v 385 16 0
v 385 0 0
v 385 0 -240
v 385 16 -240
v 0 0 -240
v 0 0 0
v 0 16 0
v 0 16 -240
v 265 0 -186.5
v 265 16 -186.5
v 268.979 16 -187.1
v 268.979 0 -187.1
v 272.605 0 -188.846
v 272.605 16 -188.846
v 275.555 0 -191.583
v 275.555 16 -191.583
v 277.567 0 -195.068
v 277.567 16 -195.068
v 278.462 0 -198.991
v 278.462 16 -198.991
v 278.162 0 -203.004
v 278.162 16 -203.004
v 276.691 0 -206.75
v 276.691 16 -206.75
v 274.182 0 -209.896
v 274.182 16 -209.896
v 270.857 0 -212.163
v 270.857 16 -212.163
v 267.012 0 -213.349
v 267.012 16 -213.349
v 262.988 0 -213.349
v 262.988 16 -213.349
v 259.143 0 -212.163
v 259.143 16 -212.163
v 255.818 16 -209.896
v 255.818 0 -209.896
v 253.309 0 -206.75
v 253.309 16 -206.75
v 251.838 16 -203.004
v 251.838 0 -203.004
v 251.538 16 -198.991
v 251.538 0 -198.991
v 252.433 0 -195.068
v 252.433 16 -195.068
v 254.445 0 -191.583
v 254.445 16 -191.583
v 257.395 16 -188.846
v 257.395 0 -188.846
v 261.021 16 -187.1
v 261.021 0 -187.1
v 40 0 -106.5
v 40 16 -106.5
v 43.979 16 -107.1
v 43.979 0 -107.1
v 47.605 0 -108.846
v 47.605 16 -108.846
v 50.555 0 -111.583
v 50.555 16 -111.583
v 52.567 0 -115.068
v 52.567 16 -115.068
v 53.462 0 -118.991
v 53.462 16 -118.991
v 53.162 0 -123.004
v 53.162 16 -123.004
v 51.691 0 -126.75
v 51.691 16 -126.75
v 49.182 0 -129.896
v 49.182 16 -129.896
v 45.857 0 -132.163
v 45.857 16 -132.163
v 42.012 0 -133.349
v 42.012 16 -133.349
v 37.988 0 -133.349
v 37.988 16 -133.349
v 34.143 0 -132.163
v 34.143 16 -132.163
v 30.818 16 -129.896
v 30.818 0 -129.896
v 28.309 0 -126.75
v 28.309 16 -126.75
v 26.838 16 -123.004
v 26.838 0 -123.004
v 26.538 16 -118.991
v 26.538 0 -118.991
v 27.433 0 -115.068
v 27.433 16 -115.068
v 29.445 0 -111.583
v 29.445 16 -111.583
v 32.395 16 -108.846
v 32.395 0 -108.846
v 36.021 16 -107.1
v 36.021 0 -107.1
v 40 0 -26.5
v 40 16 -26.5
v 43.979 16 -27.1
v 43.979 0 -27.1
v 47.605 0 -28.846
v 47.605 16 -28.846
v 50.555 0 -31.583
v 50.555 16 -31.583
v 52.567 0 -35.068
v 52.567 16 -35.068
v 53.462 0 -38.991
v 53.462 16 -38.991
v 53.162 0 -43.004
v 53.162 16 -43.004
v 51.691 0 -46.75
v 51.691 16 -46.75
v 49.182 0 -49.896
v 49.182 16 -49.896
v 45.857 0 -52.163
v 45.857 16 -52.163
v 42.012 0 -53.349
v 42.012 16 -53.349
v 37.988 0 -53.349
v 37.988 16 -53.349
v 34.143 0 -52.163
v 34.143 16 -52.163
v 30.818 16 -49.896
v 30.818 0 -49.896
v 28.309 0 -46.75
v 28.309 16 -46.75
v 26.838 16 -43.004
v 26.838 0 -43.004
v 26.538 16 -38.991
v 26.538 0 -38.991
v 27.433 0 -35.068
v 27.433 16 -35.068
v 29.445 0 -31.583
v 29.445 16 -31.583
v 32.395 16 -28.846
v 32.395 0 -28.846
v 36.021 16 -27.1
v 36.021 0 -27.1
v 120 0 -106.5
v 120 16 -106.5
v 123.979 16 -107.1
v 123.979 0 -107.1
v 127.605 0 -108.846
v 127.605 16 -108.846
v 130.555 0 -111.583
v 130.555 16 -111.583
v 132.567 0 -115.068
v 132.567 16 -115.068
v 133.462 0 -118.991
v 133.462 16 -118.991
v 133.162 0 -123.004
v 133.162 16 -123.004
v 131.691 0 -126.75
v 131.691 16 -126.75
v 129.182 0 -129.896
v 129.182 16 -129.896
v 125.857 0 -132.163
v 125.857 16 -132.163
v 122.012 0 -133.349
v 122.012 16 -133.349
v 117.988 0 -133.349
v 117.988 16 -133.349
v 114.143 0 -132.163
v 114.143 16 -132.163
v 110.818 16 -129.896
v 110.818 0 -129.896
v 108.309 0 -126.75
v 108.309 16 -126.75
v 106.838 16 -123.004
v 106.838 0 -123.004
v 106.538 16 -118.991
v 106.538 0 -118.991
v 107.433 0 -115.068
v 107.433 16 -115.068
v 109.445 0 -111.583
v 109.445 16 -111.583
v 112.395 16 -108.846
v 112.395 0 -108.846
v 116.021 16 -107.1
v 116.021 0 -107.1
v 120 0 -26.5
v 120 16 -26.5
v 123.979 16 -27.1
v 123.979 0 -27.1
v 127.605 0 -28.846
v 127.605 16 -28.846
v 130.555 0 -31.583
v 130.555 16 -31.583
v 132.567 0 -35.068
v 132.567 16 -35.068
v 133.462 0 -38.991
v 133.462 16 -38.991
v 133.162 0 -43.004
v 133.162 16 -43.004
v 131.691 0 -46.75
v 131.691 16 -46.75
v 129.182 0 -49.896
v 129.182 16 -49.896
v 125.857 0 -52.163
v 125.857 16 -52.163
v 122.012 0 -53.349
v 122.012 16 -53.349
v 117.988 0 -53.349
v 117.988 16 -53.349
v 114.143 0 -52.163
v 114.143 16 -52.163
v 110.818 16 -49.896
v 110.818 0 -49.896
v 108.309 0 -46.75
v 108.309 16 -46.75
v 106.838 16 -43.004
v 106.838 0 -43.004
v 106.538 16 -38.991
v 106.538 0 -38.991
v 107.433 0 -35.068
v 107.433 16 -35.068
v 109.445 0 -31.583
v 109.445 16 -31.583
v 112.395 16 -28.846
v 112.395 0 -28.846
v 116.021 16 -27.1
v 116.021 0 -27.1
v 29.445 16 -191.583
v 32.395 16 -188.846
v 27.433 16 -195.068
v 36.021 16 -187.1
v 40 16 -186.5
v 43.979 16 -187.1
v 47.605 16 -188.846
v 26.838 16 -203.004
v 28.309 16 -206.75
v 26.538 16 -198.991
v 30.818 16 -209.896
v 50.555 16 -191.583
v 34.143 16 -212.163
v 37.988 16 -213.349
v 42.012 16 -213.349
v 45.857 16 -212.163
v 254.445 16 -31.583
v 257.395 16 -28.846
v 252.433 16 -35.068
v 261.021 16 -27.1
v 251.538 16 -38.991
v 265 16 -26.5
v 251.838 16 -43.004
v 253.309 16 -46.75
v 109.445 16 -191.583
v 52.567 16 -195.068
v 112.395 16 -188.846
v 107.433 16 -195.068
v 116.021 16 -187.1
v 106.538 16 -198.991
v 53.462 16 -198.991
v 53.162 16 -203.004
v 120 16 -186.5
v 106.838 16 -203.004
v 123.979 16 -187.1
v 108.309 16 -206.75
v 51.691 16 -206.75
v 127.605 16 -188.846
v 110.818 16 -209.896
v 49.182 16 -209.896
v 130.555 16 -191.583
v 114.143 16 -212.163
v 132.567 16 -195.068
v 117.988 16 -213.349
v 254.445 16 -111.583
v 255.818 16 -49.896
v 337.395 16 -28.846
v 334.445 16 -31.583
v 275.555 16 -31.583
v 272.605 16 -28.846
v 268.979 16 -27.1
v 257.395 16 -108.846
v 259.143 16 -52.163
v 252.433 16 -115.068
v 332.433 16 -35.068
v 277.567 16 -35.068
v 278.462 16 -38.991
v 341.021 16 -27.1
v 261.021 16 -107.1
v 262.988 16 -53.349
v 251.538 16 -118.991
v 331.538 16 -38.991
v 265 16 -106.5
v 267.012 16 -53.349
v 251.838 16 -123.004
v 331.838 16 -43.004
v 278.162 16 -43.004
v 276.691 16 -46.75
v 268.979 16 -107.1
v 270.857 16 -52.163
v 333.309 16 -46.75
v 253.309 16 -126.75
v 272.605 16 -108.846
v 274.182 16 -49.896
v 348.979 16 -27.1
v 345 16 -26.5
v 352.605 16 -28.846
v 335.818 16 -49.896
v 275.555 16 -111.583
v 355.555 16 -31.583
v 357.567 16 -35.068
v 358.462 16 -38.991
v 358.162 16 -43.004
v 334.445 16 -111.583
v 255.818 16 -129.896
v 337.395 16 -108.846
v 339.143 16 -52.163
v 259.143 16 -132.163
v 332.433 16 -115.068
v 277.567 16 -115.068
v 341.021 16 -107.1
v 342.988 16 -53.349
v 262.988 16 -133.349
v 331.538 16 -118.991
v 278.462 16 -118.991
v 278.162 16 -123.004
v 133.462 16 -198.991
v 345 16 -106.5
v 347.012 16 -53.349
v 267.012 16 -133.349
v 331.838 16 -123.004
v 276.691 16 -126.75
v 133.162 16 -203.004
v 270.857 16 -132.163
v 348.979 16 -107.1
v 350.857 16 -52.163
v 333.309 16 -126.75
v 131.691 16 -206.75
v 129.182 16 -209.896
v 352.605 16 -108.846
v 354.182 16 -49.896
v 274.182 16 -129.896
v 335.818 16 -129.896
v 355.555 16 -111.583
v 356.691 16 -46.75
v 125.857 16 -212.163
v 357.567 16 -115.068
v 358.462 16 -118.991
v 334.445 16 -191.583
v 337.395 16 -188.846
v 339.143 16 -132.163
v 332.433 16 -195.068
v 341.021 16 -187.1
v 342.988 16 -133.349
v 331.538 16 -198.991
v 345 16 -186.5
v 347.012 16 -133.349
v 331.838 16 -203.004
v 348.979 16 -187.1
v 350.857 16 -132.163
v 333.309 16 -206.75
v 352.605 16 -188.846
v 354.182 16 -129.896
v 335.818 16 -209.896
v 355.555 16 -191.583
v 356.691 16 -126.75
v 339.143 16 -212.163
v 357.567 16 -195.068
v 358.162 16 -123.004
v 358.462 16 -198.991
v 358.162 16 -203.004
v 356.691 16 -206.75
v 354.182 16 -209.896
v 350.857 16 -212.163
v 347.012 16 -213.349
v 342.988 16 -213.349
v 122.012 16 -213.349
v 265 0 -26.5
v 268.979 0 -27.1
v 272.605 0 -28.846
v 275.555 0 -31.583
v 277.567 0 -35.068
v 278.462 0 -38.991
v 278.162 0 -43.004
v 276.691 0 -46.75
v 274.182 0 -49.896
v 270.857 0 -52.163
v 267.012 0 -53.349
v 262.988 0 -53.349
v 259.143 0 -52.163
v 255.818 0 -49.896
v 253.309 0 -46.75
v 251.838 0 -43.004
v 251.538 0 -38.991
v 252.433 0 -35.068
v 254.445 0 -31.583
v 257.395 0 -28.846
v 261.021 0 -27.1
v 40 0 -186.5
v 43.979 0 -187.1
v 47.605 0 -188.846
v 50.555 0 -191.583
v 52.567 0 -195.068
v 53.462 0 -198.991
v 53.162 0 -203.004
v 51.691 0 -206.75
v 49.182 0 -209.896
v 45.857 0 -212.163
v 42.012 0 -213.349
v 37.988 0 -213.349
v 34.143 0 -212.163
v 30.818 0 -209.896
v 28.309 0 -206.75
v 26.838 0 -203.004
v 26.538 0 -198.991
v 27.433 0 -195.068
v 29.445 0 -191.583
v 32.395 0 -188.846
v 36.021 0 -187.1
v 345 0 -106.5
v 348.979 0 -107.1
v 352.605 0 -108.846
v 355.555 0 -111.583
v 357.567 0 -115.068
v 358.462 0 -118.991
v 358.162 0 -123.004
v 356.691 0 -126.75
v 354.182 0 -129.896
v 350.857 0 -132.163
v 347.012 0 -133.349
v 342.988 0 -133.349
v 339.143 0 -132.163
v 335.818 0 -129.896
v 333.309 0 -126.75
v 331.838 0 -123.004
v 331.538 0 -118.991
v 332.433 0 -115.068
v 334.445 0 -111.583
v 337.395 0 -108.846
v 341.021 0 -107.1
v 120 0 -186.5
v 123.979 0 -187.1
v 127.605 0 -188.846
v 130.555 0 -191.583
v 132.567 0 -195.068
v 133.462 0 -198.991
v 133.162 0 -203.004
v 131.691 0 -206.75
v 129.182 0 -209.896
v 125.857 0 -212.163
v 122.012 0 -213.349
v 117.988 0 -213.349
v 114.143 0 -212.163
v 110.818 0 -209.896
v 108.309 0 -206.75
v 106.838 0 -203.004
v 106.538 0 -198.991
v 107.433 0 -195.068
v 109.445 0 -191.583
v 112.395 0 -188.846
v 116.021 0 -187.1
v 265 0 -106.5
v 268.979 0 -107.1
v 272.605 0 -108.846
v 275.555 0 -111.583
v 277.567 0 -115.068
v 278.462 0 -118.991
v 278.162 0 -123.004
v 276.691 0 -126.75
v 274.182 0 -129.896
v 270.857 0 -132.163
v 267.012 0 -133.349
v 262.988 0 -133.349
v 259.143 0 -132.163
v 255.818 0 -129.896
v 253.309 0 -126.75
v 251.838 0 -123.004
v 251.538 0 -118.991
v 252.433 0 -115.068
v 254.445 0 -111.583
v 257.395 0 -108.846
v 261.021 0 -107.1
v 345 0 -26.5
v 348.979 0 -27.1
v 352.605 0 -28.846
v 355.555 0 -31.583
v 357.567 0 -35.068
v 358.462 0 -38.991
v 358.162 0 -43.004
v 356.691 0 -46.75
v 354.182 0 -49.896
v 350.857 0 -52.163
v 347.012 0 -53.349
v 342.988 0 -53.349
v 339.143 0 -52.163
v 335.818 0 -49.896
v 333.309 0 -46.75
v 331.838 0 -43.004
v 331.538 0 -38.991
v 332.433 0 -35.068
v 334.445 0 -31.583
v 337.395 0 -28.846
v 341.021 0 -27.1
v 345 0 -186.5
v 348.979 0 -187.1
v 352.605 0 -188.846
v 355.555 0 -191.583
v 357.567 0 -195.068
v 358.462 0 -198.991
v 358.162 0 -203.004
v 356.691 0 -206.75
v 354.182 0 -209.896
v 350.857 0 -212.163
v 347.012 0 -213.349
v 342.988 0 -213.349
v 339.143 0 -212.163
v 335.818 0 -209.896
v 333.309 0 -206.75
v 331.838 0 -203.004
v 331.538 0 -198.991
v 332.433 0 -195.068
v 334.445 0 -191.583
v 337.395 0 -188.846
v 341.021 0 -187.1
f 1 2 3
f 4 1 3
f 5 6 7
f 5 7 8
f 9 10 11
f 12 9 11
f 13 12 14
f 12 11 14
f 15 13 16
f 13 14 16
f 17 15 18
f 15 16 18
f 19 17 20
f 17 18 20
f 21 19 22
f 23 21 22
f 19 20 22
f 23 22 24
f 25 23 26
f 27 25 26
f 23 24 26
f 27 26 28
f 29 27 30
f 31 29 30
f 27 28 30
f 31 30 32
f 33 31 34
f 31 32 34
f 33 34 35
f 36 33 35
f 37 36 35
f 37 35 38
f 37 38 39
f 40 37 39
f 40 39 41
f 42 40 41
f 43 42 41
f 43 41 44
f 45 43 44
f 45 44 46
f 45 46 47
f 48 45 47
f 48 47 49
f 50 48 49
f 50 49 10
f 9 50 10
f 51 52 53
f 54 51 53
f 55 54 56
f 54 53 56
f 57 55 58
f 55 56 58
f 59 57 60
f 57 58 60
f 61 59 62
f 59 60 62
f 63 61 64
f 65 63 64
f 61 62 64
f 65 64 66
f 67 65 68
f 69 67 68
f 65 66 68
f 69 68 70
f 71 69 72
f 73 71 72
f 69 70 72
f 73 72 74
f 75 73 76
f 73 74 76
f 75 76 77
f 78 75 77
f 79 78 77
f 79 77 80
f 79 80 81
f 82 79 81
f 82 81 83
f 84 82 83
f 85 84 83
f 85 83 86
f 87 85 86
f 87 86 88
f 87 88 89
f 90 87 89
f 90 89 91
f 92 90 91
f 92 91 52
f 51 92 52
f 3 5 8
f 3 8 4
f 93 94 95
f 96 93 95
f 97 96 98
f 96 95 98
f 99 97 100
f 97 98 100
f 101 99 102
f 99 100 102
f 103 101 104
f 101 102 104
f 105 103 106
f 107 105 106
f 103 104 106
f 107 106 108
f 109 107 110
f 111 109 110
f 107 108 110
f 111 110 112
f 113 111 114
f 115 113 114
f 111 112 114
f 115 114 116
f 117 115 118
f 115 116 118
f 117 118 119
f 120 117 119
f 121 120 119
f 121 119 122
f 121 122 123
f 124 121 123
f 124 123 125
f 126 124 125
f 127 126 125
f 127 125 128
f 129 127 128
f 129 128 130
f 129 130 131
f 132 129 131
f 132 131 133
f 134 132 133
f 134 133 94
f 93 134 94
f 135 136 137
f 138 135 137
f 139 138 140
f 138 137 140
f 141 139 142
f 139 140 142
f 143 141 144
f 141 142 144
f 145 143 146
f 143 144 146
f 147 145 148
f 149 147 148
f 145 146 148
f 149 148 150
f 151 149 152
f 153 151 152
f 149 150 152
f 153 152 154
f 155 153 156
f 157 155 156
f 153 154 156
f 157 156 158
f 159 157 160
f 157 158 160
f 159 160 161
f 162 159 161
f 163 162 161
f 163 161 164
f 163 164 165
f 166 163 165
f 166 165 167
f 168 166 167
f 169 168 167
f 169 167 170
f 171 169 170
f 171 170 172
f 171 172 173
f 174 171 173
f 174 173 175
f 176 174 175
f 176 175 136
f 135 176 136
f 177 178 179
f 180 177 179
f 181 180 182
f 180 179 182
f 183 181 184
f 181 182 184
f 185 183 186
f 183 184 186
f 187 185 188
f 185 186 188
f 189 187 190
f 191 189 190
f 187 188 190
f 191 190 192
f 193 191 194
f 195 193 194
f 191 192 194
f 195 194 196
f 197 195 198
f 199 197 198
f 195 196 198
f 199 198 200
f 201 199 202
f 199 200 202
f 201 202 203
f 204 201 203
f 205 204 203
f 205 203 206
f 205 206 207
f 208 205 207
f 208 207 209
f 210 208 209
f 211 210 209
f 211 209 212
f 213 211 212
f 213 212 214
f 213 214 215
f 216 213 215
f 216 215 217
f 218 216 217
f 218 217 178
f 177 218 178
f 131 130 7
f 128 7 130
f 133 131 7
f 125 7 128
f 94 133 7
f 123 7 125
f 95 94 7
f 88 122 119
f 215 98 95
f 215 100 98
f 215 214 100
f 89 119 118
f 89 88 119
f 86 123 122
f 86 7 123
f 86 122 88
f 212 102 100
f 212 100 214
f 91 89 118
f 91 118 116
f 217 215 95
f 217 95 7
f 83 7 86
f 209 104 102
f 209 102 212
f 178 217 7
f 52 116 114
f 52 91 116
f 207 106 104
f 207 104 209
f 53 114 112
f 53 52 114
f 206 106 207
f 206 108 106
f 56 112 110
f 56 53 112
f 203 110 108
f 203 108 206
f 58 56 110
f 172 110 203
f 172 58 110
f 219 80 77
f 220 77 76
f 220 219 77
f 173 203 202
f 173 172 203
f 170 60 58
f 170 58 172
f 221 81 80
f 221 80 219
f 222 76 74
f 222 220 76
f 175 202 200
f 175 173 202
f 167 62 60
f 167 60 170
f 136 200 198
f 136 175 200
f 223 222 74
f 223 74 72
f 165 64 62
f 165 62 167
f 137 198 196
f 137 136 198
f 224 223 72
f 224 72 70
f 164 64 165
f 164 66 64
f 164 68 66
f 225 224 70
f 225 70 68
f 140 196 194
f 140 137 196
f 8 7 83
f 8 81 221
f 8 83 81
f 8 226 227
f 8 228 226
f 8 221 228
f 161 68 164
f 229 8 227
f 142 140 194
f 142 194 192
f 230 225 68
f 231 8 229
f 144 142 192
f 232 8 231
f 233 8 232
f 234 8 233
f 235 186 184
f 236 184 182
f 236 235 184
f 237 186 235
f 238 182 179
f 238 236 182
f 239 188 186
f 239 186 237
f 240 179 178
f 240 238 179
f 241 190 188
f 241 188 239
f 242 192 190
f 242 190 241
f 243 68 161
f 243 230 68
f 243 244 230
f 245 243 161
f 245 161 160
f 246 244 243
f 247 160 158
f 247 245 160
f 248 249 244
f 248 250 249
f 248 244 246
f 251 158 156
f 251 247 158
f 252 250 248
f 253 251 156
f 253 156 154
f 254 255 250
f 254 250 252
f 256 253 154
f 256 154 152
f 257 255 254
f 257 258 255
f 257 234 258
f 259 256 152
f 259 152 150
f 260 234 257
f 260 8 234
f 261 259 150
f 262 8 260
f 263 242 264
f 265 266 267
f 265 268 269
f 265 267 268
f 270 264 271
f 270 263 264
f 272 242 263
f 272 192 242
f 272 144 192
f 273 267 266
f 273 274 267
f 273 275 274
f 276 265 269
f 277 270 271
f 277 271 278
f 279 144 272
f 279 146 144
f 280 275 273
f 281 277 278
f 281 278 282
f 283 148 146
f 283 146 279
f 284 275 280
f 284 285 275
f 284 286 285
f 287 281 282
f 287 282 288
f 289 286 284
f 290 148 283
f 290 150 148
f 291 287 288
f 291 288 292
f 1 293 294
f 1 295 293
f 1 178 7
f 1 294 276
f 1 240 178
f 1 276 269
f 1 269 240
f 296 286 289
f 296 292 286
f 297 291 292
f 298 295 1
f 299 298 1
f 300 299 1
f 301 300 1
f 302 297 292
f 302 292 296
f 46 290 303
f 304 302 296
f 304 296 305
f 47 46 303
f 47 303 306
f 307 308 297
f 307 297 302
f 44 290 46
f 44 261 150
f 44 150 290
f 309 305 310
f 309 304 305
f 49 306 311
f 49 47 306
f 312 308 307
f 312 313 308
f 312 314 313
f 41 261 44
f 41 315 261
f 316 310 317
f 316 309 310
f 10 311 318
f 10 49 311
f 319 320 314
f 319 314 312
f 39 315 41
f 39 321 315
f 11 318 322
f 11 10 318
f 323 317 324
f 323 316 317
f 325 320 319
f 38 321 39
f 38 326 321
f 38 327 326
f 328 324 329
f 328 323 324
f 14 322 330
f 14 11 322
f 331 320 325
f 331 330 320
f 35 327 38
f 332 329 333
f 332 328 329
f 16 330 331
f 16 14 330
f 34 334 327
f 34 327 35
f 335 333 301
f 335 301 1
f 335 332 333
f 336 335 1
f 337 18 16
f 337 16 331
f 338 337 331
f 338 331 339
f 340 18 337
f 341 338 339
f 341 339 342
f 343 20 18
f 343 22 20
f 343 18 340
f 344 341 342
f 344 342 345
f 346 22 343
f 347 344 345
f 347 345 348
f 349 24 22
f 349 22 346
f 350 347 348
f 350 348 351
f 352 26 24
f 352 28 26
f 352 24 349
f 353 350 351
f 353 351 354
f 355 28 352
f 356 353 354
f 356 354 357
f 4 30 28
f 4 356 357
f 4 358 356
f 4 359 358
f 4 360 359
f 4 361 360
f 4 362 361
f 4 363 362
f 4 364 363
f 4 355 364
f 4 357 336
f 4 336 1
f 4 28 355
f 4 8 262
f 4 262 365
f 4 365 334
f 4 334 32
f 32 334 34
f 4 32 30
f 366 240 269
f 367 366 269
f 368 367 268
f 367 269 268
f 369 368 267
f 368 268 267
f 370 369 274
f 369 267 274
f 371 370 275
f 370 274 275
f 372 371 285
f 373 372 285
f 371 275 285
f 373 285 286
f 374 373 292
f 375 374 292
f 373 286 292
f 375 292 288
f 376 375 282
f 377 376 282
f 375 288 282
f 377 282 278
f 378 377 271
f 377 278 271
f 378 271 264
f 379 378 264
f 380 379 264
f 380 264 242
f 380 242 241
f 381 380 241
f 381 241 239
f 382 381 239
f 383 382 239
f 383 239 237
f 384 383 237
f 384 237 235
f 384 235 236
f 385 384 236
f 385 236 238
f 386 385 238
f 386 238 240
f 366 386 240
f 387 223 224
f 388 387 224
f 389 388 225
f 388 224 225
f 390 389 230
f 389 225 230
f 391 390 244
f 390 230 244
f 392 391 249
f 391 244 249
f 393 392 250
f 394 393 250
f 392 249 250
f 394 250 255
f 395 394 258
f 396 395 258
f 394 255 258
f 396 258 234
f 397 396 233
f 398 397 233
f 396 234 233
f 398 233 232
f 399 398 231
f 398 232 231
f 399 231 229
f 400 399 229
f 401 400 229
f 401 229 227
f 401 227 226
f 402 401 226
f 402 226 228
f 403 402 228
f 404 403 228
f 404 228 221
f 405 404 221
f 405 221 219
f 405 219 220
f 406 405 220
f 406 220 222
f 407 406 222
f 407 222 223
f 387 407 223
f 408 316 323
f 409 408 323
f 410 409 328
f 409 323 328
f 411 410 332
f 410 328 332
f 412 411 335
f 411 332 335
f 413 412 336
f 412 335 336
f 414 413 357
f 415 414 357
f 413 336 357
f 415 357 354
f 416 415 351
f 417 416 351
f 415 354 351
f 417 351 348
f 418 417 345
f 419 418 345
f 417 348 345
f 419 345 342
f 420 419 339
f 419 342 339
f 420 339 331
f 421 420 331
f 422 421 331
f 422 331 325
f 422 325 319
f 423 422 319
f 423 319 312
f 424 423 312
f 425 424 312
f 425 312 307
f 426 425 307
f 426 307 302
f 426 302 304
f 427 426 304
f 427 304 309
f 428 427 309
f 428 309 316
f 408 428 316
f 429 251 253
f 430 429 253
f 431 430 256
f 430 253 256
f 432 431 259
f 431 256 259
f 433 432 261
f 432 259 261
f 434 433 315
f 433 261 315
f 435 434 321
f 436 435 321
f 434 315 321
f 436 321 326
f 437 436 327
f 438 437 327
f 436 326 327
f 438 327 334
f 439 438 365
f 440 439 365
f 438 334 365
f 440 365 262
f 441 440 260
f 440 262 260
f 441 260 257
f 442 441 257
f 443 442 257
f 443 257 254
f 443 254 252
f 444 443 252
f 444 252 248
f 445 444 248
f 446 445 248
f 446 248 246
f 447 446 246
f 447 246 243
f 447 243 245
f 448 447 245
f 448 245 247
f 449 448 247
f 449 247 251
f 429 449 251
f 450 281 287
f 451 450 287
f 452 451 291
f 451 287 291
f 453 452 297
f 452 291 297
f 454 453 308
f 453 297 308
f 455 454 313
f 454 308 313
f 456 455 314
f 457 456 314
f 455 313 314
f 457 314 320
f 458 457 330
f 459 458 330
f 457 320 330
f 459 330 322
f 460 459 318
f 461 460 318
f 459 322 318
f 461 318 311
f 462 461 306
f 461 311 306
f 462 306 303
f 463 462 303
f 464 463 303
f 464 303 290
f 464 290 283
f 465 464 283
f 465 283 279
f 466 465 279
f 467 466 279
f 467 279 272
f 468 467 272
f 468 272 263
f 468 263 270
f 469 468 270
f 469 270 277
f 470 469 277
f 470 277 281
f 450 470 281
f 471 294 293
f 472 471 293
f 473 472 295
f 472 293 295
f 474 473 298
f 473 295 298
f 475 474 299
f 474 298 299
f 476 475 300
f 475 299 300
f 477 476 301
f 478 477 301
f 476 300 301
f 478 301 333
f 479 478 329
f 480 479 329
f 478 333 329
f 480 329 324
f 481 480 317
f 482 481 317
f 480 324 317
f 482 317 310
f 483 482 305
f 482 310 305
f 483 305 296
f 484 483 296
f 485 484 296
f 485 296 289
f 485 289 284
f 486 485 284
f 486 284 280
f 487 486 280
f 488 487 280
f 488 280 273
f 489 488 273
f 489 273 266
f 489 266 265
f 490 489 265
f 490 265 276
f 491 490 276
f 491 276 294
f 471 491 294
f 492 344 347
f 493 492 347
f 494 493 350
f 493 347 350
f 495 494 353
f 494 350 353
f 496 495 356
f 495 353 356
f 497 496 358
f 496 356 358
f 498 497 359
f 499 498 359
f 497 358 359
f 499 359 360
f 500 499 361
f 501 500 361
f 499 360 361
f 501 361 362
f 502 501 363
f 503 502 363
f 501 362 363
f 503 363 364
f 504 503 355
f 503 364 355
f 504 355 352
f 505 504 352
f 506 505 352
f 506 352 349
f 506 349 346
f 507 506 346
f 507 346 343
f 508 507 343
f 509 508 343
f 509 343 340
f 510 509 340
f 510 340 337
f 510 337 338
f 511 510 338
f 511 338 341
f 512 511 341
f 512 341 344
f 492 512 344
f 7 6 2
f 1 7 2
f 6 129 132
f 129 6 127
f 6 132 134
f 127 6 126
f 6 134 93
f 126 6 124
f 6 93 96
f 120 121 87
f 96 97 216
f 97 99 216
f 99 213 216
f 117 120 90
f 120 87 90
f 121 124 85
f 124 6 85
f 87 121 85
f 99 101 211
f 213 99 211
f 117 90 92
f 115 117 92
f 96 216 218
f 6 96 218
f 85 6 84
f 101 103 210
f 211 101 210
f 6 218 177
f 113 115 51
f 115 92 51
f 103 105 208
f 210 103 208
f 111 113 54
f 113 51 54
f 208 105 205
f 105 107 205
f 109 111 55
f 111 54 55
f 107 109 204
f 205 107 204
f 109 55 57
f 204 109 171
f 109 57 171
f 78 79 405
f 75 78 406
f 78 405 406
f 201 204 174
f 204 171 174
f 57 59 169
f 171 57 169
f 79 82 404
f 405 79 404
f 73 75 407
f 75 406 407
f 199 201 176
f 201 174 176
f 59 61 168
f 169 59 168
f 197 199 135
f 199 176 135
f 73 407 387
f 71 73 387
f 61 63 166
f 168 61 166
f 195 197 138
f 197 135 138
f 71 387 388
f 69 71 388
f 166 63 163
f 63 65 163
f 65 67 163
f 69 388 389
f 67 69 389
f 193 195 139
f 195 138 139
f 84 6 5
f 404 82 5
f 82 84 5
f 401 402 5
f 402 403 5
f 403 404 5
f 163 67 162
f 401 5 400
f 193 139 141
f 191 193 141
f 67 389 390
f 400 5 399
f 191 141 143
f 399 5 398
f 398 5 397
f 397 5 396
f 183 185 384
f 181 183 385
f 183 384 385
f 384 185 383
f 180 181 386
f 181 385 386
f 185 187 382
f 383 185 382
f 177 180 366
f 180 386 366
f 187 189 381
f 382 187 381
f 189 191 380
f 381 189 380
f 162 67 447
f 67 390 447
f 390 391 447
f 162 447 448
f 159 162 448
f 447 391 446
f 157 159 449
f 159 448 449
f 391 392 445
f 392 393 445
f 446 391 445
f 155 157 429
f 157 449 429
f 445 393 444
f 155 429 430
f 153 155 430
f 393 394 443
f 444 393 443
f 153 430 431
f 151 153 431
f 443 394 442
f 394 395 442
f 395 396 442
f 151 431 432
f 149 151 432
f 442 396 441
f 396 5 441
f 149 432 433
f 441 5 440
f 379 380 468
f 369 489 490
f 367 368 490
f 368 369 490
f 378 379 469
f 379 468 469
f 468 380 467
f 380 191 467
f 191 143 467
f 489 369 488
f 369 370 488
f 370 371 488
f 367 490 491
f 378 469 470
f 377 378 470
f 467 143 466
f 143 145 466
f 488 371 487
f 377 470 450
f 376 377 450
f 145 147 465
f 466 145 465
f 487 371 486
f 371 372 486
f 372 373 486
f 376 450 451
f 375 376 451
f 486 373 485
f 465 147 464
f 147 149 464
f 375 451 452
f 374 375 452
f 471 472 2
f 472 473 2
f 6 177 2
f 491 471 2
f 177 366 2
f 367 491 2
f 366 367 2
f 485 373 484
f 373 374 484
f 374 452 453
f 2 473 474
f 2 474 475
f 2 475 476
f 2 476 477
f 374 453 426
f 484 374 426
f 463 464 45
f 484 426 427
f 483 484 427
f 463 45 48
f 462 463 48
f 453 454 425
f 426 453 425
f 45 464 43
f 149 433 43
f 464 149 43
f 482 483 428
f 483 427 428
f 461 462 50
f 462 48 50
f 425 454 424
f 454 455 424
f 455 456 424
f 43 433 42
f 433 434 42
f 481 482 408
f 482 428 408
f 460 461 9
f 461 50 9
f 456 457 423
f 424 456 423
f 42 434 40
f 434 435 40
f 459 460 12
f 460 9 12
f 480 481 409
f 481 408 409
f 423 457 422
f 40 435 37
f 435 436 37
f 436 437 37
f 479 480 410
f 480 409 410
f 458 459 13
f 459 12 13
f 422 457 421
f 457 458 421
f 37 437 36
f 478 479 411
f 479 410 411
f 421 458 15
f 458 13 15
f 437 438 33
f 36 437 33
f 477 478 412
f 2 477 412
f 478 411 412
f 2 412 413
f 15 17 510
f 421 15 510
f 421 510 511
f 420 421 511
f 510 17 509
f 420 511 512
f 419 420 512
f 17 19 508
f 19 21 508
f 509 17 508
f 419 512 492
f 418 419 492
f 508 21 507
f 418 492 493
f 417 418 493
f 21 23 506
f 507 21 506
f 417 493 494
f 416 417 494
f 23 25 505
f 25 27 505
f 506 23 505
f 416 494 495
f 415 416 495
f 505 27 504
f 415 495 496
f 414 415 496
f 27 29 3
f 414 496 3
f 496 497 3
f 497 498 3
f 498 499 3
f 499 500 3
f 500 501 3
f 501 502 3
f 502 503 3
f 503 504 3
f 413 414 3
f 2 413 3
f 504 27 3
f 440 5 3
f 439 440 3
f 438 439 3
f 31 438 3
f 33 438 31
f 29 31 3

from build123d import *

# Parameters (mm, degrees)
SKETCH_1_W                       = 385
SKETCH_1_H                       = 240
EXTRUDE_1_DEPTH                  = 16
SKETCH_2_R                       = 13.5
CUT_EXTRUDE_1_DEPTH              = 454.961452108
PATTERN_LINEAR_1_COUNT           = 2
PATTERN_LINEAR_1_PITCH           = 80
PATTERN_LINEAR_2_COUNT           = 2
PATTERN_LINEAR_2_PITCH           = 80
PATTERN_LINEAR_3_COUNT           = 2
PATTERN_LINEAR_3_PITCH           = 80
PATTERN_LINEAR_3_COPY_1_SKETCH_R = 13.5
PATTERN_LINEAR_3_COPY_1_DEPTH    = 454.961452108
PATTERN_LINEAR_3_COPY_2_SKETCH_R = 13.5
PATTERN_LINEAR_3_COPY_2_DEPTH    = 454.961452108
PATTERN_LINEAR_4_COUNT           = 2
PATTERN_LINEAR_4_PITCH           = 225
PATTERN_LINEAR_4_COPY_1_SKETCH_R = 13.5
PATTERN_LINEAR_4_COPY_1_DEPTH    = 454.961452108
PATTERN_LINEAR_4_COPY_2_SKETCH_R = 13.5
PATTERN_LINEAR_4_COPY_2_DEPTH    = 454.961452108
PATTERN_LINEAR_4_COPY_3_SKETCH_R = 13.5
PATTERN_LINEAR_4_COPY_3_DEPTH    = 454.961452108
PATTERN_LINEAR_4_COPY_4_SKETCH_R = 13.5
PATTERN_LINEAR_4_COPY_4_DEPTH    = 454.961452108
PATTERN_LINEAR_4_COPY_5_SKETCH_R = 13.5
PATTERN_LINEAR_4_COPY_5_DEPTH    = 454.961452108


with BuildPart() as part:
    # 草图1 → 凸台-拉伸1 (new body)
    with BuildSketch(Plane(origin=(0, 0, 0), x_dir=(1, 0, 0), z_dir=(0, 1, 0))):
        with Locations((192.5, 120)):
            Rectangle(SKETCH_1_W, SKETCH_1_H)
    extrude(amount=EXTRUDE_1_DEPTH)

    # 草图2 → 切除-拉伸1 (cut, through all)
    with BuildSketch(Plane(origin=(0, 16, 0), x_dir=(1, 0, 0), z_dir=(0, 1, 0))):
        with Locations(Location((120, 120, 0), (0, 0, 270))):
            Circle(SKETCH_2_R)
    cut_extrude_1 = extrude(amount=-CUT_EXTRUDE_1_DEPTH, mode=Mode.SUBTRACT)

    # 阵列(线性)1: 切除-拉伸1 ×2
    with Locations(*[(0, 0, -i * PATTERN_LINEAR_1_PITCH) for i in range(1, PATTERN_LINEAR_1_COUNT)]):
        add(cut_extrude_1, mode=Mode.SUBTRACT)

    # 阵列(线性)2: 切除-拉伸1 ×2
    with Locations(*[(0, 0, i * PATTERN_LINEAR_2_PITCH) for i in range(1, PATTERN_LINEAR_2_COUNT)]):
        add(cut_extrude_1, mode=Mode.SUBTRACT)

    # 阵列(线性)3: 切除-拉伸1 ×2
    with Locations(*[(-i * PATTERN_LINEAR_3_PITCH, 0, 0) for i in range(1, PATTERN_LINEAR_3_COUNT)]):
        add(cut_extrude_1, mode=Mode.SUBTRACT)

    # 阵列(线性)3 copy 1 sketch → 阵列(线性)3 copy 1 (cut, through all)
    with BuildSketch(Plane(origin=(-80, 16, -80), x_dir=(1, 0, 0), z_dir=(0, 1, 0))):
        with Locations(Location((120, 120, 0), (0, 0, 270))):
            Circle(PATTERN_LINEAR_3_COPY_1_SKETCH_R)
    extrude(amount=-PATTERN_LINEAR_3_COPY_1_DEPTH, mode=Mode.SUBTRACT)

    # 阵列(线性)3 copy 2 sketch → 阵列(线性)3 copy 2 (cut, through all)
    with BuildSketch(Plane(origin=(-80, 16, 80), x_dir=(1, 0, 0), z_dir=(0, 1, 0))):
        with Locations(Location((120, 120, 0), (0, 0, 270))):
            Circle(PATTERN_LINEAR_3_COPY_2_SKETCH_R)
    extrude(amount=-PATTERN_LINEAR_3_COPY_2_DEPTH, mode=Mode.SUBTRACT)

    # 阵列(线性)4: 切除-拉伸1 ×2
    with Locations(*[(i * PATTERN_LINEAR_4_PITCH, 0, 0) for i in range(1, PATTERN_LINEAR_4_COUNT)]):
        add(cut_extrude_1, mode=Mode.SUBTRACT)

    # 阵列(线性)4 copy 1 sketch → 阵列(线性)4 copy 1 (cut, through all)
    with BuildSketch(Plane(origin=(225, 16, -80), x_dir=(1, 0, 0), z_dir=(0, 1, 0))):
        with Locations(Location((120, 120, 0), (0, 0, 270))):
            Circle(PATTERN_LINEAR_4_COPY_1_SKETCH_R)
    extrude(amount=-PATTERN_LINEAR_4_COPY_1_DEPTH, mode=Mode.SUBTRACT)

    # 阵列(线性)4 copy 2 sketch → 阵列(线性)4 copy 2 (cut, through all)
    with BuildSketch(Plane(origin=(225, 16, 80), x_dir=(1, 0, 0), z_dir=(0, 1, 0))):
        with Locations(Location((120, 120, 0), (0, 0, 270))):
            Circle(PATTERN_LINEAR_4_COPY_2_SKETCH_R)
    extrude(amount=-PATTERN_LINEAR_4_COPY_2_DEPTH, mode=Mode.SUBTRACT)

    # 阵列(线性)4 copy 3 sketch → 阵列(线性)4 copy 3 (cut, through all)
    with BuildSketch(Plane(origin=(145, 16, 0), x_dir=(1, 0, 0), z_dir=(0, 1, 0))):
        with Locations(Location((120, 120, 0), (0, 0, 270))):
            Circle(PATTERN_LINEAR_4_COPY_3_SKETCH_R)
    extrude(amount=-PATTERN_LINEAR_4_COPY_3_DEPTH, mode=Mode.SUBTRACT)

    # 阵列(线性)4 copy 4 sketch → 阵列(线性)4 copy 4 (cut, through all)
    with BuildSketch(Plane(origin=(145, 16, -80), x_dir=(1, 0, 0), z_dir=(0, 1, 0))):
        with Locations(Location((120, 120, 0), (0, 0, 270))):
            Circle(PATTERN_LINEAR_4_COPY_4_SKETCH_R)
    extrude(amount=-PATTERN_LINEAR_4_COPY_4_DEPTH, mode=Mode.SUBTRACT)

    # 阵列(线性)4 copy 5 sketch → 阵列(线性)4 copy 5 (cut, through all)
    with BuildSketch(Plane(origin=(145, 16, 80), x_dir=(1, 0, 0), z_dir=(0, 1, 0))):
        with Locations(Location((120, 120, 0), (0, 0, 270))):
            Circle(PATTERN_LINEAR_4_COPY_5_SKETCH_R)
    extrude(amount=-PATTERN_LINEAR_4_COPY_5_DEPTH, mode=Mode.SUBTRACT)


solid = part.part
